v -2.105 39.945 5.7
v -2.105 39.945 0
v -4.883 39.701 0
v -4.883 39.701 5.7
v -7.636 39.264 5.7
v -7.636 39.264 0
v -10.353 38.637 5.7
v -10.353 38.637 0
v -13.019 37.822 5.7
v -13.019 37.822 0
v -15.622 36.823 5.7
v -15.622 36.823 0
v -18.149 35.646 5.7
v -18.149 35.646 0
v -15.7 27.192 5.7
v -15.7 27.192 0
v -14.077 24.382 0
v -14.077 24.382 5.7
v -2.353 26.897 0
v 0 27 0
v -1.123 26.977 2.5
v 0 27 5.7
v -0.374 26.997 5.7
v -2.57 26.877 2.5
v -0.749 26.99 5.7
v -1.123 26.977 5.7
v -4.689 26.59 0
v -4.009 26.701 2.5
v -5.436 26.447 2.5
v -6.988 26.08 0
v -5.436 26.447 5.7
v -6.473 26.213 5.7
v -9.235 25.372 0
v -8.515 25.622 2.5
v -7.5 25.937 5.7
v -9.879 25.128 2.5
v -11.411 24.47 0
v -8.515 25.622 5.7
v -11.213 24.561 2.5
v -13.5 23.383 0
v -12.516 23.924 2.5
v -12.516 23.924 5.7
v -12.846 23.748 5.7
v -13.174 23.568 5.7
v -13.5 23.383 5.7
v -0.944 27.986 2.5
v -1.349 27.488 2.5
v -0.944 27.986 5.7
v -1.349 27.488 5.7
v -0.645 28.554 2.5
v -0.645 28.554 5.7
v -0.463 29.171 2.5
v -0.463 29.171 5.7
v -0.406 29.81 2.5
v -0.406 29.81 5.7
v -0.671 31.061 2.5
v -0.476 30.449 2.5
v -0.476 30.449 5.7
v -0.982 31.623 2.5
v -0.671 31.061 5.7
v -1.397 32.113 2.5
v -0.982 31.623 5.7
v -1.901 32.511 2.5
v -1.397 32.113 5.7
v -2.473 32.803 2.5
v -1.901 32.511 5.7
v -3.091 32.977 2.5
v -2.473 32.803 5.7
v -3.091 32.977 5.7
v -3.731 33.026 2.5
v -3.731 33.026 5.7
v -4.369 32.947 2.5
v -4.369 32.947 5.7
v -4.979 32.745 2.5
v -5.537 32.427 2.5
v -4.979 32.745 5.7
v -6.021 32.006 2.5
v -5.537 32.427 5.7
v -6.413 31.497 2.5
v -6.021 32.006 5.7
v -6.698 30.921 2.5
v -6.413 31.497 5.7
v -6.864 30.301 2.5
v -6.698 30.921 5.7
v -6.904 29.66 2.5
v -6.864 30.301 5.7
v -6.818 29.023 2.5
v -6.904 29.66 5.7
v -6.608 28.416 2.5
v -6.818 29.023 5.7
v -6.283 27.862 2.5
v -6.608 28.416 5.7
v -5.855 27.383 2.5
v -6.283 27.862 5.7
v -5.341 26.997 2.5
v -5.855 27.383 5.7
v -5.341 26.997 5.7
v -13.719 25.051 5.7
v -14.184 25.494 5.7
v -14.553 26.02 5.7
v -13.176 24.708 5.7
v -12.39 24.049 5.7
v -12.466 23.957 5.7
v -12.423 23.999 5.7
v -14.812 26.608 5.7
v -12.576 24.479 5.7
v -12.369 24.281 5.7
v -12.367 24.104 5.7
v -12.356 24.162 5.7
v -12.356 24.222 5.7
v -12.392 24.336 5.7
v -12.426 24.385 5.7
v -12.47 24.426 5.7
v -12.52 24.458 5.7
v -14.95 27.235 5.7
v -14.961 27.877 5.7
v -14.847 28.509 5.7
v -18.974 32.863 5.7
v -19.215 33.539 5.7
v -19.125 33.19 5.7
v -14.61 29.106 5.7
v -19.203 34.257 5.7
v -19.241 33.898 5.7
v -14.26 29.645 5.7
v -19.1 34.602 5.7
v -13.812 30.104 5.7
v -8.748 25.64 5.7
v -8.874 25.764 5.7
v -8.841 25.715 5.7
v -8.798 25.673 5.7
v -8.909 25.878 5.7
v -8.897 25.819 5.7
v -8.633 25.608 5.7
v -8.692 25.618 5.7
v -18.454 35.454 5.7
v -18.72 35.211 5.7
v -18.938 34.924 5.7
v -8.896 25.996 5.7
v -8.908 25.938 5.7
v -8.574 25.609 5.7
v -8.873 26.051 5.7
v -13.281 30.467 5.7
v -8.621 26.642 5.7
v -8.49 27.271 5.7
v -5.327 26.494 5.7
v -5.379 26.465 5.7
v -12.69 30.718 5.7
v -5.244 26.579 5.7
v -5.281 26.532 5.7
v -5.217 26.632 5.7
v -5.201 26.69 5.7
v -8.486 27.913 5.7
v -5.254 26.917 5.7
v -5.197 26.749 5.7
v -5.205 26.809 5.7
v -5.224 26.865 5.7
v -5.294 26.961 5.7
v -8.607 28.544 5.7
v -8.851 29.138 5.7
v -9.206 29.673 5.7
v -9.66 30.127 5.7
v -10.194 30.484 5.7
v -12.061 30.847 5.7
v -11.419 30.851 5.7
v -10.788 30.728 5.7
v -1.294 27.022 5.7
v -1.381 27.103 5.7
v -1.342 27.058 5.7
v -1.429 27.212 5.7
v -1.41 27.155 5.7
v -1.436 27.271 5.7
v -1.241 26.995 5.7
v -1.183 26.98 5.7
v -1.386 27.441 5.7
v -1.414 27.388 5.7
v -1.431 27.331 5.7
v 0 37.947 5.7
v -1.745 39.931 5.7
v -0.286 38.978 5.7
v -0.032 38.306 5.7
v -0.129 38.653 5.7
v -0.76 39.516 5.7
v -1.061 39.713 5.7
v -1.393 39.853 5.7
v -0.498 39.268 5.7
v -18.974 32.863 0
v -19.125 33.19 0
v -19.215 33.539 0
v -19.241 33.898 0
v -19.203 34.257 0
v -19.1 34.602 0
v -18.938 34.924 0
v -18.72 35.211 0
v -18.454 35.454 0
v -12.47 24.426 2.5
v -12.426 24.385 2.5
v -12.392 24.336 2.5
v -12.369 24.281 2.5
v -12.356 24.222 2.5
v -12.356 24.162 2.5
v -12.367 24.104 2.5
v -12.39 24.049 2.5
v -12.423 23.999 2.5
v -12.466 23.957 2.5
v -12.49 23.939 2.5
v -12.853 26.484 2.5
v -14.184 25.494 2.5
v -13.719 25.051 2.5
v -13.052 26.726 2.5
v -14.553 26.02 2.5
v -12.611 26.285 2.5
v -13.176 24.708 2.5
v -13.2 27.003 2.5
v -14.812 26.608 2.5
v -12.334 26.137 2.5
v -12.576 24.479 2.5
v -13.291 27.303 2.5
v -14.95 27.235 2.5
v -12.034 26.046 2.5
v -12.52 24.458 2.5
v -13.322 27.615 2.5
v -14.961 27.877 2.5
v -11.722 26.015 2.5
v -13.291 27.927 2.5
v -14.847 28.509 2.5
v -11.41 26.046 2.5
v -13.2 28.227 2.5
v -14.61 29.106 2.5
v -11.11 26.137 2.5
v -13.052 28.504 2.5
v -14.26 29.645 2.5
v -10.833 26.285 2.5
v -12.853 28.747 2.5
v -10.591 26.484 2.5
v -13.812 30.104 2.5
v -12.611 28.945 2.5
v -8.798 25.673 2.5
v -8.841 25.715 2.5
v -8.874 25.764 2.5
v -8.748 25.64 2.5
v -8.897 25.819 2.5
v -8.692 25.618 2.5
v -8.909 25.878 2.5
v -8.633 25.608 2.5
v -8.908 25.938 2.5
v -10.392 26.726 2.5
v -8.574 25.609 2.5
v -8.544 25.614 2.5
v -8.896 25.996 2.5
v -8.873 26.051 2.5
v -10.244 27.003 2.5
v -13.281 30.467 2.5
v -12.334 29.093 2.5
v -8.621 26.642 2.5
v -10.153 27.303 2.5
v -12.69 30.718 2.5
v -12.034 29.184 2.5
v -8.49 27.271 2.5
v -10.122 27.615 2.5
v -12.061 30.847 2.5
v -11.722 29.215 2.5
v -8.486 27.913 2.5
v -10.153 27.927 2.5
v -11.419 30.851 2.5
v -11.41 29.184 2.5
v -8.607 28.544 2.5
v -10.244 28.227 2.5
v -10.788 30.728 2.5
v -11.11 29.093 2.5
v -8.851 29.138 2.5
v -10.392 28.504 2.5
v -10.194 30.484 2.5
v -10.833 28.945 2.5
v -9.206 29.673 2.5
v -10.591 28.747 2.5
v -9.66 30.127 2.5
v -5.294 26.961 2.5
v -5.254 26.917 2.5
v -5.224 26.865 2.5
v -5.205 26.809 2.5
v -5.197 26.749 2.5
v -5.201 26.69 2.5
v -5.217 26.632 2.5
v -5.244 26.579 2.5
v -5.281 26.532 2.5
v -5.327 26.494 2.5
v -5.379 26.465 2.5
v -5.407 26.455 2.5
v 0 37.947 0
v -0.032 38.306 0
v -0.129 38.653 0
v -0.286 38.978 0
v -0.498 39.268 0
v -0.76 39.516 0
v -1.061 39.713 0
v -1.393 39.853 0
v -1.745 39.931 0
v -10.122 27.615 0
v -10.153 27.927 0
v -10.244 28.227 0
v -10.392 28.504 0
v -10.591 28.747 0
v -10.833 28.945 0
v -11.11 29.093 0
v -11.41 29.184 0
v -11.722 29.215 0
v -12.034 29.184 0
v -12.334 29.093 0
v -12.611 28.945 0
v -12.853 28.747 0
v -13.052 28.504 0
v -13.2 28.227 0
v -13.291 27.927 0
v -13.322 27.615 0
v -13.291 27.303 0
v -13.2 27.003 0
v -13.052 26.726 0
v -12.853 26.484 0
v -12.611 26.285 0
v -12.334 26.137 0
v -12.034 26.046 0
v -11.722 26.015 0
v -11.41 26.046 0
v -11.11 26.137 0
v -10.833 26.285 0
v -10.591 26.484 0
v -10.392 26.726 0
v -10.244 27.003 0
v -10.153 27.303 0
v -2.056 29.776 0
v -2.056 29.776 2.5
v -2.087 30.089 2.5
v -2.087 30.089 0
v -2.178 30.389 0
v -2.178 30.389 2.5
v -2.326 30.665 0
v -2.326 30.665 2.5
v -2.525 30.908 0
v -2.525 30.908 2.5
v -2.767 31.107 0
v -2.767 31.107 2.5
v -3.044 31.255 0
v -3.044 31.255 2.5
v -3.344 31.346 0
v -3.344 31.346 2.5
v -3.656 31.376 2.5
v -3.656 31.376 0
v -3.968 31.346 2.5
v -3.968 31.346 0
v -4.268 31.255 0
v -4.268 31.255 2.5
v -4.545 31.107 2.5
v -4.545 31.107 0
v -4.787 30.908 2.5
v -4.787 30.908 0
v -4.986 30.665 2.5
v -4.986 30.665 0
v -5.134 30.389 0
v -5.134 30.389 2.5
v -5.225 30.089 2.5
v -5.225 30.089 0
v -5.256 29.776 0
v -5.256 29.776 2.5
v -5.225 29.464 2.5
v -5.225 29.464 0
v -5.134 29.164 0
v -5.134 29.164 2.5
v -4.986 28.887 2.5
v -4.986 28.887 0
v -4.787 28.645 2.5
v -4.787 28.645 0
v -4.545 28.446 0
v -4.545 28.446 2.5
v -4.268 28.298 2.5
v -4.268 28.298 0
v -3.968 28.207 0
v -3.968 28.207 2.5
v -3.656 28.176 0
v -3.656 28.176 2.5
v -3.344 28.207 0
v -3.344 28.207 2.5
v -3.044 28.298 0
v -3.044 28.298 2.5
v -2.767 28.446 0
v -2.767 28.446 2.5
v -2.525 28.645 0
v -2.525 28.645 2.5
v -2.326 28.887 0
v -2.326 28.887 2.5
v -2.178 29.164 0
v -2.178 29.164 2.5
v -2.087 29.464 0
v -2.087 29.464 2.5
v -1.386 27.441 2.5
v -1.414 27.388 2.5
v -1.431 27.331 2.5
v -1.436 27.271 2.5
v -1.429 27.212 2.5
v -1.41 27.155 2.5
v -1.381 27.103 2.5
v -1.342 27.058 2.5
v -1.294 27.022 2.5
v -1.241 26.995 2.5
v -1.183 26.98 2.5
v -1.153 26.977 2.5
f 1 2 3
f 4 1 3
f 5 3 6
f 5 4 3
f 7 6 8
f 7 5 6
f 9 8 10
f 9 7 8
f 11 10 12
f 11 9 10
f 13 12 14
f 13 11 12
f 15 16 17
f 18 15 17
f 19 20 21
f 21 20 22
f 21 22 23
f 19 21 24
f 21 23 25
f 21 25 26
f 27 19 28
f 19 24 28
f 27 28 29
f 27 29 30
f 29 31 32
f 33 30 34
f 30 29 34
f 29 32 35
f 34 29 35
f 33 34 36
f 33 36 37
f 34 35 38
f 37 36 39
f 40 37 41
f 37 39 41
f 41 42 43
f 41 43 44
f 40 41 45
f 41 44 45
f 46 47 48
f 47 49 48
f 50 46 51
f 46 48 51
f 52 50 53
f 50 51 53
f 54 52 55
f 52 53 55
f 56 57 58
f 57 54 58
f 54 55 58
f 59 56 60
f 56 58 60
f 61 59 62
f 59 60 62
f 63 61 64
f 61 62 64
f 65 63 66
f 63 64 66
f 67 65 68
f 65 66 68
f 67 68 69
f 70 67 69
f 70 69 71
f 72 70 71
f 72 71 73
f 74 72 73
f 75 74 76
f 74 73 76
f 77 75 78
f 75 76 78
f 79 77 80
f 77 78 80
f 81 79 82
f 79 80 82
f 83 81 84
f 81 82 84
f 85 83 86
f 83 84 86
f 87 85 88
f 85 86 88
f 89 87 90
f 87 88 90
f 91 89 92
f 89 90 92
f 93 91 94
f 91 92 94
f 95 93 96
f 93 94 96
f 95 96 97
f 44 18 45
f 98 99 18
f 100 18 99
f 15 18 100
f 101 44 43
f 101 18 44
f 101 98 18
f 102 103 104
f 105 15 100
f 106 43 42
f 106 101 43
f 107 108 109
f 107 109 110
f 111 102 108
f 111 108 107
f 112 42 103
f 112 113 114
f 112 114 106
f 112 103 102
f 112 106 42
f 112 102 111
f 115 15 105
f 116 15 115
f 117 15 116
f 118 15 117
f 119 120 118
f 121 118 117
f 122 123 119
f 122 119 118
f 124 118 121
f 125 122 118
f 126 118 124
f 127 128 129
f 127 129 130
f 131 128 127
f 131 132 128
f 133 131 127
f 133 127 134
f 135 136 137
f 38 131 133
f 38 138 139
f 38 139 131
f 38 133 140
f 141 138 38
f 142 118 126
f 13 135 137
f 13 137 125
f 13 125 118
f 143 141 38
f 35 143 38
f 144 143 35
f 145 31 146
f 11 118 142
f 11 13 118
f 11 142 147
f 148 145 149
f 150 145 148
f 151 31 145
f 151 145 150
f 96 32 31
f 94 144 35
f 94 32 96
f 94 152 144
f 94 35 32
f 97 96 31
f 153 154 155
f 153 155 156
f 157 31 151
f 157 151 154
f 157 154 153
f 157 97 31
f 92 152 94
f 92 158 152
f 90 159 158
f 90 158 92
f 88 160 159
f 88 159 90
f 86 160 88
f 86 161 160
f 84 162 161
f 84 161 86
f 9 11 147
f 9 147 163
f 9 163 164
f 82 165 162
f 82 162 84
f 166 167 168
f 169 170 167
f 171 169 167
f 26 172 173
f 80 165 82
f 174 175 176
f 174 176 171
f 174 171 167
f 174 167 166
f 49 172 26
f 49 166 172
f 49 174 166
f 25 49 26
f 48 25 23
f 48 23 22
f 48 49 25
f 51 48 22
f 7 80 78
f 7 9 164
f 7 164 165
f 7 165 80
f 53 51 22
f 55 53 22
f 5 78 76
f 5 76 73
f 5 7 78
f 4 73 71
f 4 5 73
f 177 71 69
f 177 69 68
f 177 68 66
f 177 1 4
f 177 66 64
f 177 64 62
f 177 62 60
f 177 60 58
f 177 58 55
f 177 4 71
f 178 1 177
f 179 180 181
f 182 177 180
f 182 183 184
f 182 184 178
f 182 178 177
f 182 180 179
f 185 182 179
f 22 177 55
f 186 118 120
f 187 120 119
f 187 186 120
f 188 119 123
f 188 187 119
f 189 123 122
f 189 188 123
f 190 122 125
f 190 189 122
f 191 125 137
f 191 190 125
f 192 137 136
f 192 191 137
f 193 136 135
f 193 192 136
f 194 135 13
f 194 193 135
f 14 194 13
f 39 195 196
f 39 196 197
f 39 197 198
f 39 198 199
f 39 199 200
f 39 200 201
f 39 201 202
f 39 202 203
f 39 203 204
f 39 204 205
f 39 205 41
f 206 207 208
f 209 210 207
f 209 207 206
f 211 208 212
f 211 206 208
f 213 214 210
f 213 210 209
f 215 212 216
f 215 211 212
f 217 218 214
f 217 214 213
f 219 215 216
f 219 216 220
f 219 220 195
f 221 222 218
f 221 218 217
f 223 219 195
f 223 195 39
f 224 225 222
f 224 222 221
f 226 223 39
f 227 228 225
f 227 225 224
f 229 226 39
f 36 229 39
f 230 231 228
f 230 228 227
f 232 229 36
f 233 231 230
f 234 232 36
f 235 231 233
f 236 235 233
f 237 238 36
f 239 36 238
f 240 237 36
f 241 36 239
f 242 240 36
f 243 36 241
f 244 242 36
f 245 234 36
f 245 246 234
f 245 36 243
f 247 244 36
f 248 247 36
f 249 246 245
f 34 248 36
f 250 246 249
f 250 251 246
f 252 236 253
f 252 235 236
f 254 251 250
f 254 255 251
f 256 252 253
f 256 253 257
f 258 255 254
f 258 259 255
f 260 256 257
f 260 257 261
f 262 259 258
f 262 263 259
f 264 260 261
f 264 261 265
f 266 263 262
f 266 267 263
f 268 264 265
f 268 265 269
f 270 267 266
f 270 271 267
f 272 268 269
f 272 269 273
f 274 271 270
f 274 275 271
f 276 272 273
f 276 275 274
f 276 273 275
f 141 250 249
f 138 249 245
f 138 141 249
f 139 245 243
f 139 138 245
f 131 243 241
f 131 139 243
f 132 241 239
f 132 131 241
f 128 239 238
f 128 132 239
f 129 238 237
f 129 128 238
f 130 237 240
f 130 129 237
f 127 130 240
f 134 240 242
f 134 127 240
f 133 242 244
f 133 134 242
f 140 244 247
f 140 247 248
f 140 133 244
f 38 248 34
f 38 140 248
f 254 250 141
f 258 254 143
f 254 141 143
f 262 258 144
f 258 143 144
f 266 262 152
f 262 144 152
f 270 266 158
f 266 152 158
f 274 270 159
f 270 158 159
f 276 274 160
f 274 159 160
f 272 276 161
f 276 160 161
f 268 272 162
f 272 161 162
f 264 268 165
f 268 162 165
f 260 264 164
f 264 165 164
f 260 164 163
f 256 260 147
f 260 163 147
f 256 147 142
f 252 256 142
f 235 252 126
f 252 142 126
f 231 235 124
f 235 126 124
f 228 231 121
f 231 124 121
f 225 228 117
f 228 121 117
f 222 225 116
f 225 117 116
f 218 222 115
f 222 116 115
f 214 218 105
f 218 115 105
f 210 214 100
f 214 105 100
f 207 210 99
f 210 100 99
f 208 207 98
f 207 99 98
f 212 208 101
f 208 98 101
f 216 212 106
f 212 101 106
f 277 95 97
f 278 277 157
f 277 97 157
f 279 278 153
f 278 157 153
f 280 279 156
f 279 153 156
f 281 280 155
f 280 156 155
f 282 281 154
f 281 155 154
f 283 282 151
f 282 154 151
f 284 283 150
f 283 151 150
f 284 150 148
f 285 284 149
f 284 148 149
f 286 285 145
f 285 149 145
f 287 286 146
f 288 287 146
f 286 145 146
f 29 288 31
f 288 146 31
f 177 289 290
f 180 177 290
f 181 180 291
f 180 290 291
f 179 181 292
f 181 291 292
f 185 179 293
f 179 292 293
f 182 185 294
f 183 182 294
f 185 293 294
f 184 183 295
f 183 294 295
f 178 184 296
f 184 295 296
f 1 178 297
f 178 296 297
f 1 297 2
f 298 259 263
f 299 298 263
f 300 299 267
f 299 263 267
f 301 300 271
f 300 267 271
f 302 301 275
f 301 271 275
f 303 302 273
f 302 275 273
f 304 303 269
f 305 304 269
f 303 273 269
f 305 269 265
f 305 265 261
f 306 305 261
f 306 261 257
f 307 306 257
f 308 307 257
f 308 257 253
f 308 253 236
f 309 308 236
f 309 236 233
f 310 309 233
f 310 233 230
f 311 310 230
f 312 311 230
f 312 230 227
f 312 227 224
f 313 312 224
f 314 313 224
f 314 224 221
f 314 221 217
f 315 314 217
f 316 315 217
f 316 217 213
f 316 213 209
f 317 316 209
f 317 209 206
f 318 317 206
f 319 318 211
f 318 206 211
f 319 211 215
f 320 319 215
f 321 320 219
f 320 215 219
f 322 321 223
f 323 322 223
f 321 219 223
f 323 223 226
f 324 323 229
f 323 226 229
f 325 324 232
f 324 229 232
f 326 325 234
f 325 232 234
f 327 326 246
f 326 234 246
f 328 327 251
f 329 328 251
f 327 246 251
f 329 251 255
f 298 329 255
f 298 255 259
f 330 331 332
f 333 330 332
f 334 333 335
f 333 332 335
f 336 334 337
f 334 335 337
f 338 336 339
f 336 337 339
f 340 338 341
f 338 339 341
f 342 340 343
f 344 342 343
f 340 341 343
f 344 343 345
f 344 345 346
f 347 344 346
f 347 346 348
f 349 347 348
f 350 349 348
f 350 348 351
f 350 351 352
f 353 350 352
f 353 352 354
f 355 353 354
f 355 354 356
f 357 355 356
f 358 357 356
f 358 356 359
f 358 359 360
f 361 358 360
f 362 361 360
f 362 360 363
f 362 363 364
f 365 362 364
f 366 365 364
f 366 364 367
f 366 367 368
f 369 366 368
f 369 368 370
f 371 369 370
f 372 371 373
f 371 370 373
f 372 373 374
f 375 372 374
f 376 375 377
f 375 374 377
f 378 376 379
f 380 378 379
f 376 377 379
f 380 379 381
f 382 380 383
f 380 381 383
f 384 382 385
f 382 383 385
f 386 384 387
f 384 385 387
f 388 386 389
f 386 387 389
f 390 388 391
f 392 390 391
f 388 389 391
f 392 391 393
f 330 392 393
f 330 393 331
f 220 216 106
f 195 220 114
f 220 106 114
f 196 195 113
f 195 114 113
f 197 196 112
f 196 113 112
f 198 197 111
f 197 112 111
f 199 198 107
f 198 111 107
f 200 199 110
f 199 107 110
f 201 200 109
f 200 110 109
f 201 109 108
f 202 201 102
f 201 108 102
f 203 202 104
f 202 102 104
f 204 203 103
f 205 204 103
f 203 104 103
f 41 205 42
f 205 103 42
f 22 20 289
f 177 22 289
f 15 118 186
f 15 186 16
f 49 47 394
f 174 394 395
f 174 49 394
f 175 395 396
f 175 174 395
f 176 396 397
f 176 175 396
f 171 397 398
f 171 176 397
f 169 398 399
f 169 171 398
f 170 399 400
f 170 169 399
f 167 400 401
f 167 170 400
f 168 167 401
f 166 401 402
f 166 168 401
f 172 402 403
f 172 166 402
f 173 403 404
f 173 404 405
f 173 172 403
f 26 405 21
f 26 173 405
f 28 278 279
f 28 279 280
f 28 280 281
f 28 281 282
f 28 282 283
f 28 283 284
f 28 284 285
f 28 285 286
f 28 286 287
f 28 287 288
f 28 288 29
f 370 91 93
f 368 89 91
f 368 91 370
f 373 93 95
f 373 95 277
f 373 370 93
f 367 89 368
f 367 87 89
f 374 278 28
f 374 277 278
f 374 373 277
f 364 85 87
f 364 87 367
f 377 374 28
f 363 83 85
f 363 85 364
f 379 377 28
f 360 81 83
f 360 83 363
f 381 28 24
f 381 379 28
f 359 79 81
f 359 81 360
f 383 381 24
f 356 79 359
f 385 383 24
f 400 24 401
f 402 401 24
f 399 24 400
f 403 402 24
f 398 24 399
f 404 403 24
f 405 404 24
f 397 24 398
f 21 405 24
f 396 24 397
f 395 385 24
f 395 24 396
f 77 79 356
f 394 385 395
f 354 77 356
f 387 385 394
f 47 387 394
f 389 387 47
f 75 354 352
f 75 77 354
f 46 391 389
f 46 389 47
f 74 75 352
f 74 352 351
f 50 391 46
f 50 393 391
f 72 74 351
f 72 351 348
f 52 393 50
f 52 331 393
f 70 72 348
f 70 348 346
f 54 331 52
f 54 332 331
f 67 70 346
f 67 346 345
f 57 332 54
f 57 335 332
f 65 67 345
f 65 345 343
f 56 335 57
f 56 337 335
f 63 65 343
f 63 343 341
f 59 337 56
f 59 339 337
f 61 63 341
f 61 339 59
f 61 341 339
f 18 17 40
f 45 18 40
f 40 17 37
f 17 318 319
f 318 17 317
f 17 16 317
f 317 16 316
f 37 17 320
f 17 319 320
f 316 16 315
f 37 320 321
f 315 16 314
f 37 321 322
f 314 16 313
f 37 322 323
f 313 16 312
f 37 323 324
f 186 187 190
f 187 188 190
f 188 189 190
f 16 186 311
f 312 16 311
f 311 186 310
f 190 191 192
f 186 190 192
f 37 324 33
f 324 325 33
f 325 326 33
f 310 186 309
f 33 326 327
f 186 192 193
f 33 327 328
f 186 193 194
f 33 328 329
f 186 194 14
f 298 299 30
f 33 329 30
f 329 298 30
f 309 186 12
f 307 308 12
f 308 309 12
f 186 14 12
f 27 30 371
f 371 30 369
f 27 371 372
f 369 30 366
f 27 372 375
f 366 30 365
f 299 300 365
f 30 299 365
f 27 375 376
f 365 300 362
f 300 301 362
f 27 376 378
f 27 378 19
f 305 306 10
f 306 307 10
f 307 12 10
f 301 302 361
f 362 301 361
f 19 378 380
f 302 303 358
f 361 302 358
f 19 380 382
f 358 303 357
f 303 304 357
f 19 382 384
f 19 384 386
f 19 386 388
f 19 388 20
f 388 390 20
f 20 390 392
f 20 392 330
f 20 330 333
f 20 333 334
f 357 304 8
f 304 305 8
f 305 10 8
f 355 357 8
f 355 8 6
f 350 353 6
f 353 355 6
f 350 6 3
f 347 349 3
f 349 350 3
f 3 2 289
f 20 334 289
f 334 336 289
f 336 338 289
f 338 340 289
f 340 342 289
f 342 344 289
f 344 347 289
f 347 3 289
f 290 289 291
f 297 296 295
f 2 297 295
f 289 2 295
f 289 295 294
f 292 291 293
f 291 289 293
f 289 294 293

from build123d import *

# Parameters (mm, degrees)
EXTRUDE_2_DEPTH     = 6
SKETCH_2_R          = 4
EXTRUDE_3_DEPTH     = 6
EXTRUDE_4_DEPTH     = 6
SKETCH_5_R          = 27
CUT_EXTRUDE_2_DEPTH = 46.122056691
SKETCH_6_R          = 1.6
CUT_EXTRUDE_3_DEPTH = 46.122056691
FILLET_1_R          = 2
SKETCH_7_R          = 3.25
CUT_EXTRUDE_5_DEPTH = 3.5
FILLET_4_R          = 0.3
CUT_EXTRUDE_6_DEPTH = 6
CUT_EXTRUDE_7_DEPTH = 0.3


with BuildPart() as part:
    # 草图1 → 凸台-拉伸2 (new body)
    with BuildSketch(Plane.XY):
        with BuildLine():
            Line((-15, 25.980762114), (0, 0))
            Line((0, 0), (0, 30))
            ThreePointArc((0, 30), (-7.764571353, 28.977774789), (-15, 25.980762114))
        make_face()
    extrude(amount=EXTRUDE_2_DEPTH)

    # 草图2 → 凸台-拉伸3 (add)
    with BuildSketch(Plane.XY.offset(6)):
        with Locations((-3.656080302, 29.776384549)):
            Circle(SKETCH_2_R)
        with Locations((-11.721933855, 27.615145604)):
            Circle(SKETCH_2_R)
    extrude(amount=-EXTRUDE_3_DEPTH)

    # 草图4 → 凸台-拉伸4 (add, through all)
    with BuildSketch(Plane.XY.offset(6)):
        with BuildLine():
            Line((0, 0), (0, 40))
            ThreePointArc((0, 40), (-10.352761804, 38.637033052), (-20, 34.641016151))
            Line((-20, 34.641016151), (0, 0))
        make_face()
    extrude(amount=-EXTRUDE_4_DEPTH)

    # 草图5 → 切除-拉伸2 (cut, through all)
    with BuildSketch(Plane.XY.offset(6)):
        Circle(SKETCH_5_R)
    extrude(amount=-CUT_EXTRUDE_2_DEPTH, mode=Mode.SUBTRACT)

    # 草图6 → 切除-拉伸3 (cut, through all)
    with BuildSketch(Plane.XY.offset(6)):
        with Locations((-3.656080302, 29.776384549)):
            Circle(SKETCH_6_R)
        with Locations((-11.721933855, 27.615145604)):
            Circle(SKETCH_6_R)
    extrude(amount=-CUT_EXTRUDE_3_DEPTH, mode=Mode.SUBTRACT)

    # 圆角1
    fillet_1_edges = [part.edges().sort_by_distance(p)[0] for p in [
        (0, 40, 3),
        (-20, 34.641016151, 3),
    ]]
    fillet(fillet_1_edges, radius=FILLET_1_R)

    # 草图7 → 切除-拉伸5 (cut)
    with BuildSketch(Plane.XY.offset(6)):
        with Locations((-11.721933855, 27.615145604)):
            Circle(SKETCH_7_R)
        with Locations((-3.656080302, 29.776384549)):
            Circle(SKETCH_7_R)
    extrude(amount=-CUT_EXTRUDE_5_DEPTH, mode=Mode.SUBTRACT)

    # 圆角4
    fillet_4_edges = [part.edges().sort_by_distance(p)[0] for p in [
        (-2.110567489, 26.91738295, 4.25),
        (-4.464029693, 26.628414127, 4.25),
        (-9.448243946, 25.292897943, 4.25),
        (-11.630886413, 24.366421183, 4.25),
    ]]
    fillet(fillet_4_edges, radius=FILLET_4_R)

    # 草图8 → 切除-拉伸6 (cut)
    with BuildSketch(Plane.XY.offset(6)):
        with BuildLine():
            Line((-15.699530186, 27.192383937), (-14.076854363, 24.381826968))
            ThreePointArc((-14.076854363, 24.381826968), (-15.18603547, 25.615145604), (-15.699530186, 27.192383937))
        make_face()
        with BuildLine():
            Line((0, 31.399060372), (0, 28.153708727))
            ThreePointArc((0, 28.153708727), (0.343919698, 29.776384549), (0, 31.399060372))
        make_face()
    extrude(amount=-CUT_EXTRUDE_6_DEPTH, mode=Mode.SUBTRACT)

    # 草图9 → 切除-拉伸7 (cut)
    with BuildSketch(Plane.XY.offset(6)):
        with BuildLine():
            Line((0, 27), (0, 37.947331922))
            ThreePointArc((0, 37.947331922), (-0.623505597, 39.398284422), (-2.105263158, 39.944559918))
            ThreePointArc((-2.105263158, 39.944559918), (-10.352761804, 38.637033052), (-18.149068583, 35.645635211))
            ThreePointArc((-18.149068583, 35.645635211), (-19.159170525, 34.431667974), (-18.973665961, 32.86335345))
            Line((-18.973665961, 32.86335345), (-13.5, 23.382685902))
            ThreePointArc((-13.5, 23.382685902), (-13.010612738, 23.658485924), (-12.515593512, 23.924044788))
            ThreePointArc((-12.515593512, 23.924044788), (-12.356405623, 24.222223556), (-12.575834101, 24.479327629))
            ThreePointArc((-12.575834101, 24.479327629), (-12.991810022, 30.606786377), (-8.873046225, 26.051067832))
            ThreePointArc((-8.873046225, 26.051067832), (-8.840528862, 25.714624698), (-8.515455807, 25.622002506))
            ThreePointArc((-8.515455807, 25.622002506), (-6.988114218, 26.07999731), (-5.436400199, 26.447032969))
            ThreePointArc((-5.436400199, 26.447032969), (-5.201189771, 26.689782668), (-5.341250476, 26.997409651))
            ThreePointArc((-5.341250476, 26.997409651), (-4.052155668, 33.002159542), (-1.348672009, 27.487636645))
            ThreePointArc((-1.348672009, 27.487636645), (-1.410150609, 27.155263747), (-1.123200469, 26.976627304))
            ThreePointArc((-1.123200469, 26.976627304), (-0.561721812, 26.994156194), (0, 27))
        make_face()
    extrude(amount=-CUT_EXTRUDE_7_DEPTH, mode=Mode.SUBTRACT)


solid = part.part
